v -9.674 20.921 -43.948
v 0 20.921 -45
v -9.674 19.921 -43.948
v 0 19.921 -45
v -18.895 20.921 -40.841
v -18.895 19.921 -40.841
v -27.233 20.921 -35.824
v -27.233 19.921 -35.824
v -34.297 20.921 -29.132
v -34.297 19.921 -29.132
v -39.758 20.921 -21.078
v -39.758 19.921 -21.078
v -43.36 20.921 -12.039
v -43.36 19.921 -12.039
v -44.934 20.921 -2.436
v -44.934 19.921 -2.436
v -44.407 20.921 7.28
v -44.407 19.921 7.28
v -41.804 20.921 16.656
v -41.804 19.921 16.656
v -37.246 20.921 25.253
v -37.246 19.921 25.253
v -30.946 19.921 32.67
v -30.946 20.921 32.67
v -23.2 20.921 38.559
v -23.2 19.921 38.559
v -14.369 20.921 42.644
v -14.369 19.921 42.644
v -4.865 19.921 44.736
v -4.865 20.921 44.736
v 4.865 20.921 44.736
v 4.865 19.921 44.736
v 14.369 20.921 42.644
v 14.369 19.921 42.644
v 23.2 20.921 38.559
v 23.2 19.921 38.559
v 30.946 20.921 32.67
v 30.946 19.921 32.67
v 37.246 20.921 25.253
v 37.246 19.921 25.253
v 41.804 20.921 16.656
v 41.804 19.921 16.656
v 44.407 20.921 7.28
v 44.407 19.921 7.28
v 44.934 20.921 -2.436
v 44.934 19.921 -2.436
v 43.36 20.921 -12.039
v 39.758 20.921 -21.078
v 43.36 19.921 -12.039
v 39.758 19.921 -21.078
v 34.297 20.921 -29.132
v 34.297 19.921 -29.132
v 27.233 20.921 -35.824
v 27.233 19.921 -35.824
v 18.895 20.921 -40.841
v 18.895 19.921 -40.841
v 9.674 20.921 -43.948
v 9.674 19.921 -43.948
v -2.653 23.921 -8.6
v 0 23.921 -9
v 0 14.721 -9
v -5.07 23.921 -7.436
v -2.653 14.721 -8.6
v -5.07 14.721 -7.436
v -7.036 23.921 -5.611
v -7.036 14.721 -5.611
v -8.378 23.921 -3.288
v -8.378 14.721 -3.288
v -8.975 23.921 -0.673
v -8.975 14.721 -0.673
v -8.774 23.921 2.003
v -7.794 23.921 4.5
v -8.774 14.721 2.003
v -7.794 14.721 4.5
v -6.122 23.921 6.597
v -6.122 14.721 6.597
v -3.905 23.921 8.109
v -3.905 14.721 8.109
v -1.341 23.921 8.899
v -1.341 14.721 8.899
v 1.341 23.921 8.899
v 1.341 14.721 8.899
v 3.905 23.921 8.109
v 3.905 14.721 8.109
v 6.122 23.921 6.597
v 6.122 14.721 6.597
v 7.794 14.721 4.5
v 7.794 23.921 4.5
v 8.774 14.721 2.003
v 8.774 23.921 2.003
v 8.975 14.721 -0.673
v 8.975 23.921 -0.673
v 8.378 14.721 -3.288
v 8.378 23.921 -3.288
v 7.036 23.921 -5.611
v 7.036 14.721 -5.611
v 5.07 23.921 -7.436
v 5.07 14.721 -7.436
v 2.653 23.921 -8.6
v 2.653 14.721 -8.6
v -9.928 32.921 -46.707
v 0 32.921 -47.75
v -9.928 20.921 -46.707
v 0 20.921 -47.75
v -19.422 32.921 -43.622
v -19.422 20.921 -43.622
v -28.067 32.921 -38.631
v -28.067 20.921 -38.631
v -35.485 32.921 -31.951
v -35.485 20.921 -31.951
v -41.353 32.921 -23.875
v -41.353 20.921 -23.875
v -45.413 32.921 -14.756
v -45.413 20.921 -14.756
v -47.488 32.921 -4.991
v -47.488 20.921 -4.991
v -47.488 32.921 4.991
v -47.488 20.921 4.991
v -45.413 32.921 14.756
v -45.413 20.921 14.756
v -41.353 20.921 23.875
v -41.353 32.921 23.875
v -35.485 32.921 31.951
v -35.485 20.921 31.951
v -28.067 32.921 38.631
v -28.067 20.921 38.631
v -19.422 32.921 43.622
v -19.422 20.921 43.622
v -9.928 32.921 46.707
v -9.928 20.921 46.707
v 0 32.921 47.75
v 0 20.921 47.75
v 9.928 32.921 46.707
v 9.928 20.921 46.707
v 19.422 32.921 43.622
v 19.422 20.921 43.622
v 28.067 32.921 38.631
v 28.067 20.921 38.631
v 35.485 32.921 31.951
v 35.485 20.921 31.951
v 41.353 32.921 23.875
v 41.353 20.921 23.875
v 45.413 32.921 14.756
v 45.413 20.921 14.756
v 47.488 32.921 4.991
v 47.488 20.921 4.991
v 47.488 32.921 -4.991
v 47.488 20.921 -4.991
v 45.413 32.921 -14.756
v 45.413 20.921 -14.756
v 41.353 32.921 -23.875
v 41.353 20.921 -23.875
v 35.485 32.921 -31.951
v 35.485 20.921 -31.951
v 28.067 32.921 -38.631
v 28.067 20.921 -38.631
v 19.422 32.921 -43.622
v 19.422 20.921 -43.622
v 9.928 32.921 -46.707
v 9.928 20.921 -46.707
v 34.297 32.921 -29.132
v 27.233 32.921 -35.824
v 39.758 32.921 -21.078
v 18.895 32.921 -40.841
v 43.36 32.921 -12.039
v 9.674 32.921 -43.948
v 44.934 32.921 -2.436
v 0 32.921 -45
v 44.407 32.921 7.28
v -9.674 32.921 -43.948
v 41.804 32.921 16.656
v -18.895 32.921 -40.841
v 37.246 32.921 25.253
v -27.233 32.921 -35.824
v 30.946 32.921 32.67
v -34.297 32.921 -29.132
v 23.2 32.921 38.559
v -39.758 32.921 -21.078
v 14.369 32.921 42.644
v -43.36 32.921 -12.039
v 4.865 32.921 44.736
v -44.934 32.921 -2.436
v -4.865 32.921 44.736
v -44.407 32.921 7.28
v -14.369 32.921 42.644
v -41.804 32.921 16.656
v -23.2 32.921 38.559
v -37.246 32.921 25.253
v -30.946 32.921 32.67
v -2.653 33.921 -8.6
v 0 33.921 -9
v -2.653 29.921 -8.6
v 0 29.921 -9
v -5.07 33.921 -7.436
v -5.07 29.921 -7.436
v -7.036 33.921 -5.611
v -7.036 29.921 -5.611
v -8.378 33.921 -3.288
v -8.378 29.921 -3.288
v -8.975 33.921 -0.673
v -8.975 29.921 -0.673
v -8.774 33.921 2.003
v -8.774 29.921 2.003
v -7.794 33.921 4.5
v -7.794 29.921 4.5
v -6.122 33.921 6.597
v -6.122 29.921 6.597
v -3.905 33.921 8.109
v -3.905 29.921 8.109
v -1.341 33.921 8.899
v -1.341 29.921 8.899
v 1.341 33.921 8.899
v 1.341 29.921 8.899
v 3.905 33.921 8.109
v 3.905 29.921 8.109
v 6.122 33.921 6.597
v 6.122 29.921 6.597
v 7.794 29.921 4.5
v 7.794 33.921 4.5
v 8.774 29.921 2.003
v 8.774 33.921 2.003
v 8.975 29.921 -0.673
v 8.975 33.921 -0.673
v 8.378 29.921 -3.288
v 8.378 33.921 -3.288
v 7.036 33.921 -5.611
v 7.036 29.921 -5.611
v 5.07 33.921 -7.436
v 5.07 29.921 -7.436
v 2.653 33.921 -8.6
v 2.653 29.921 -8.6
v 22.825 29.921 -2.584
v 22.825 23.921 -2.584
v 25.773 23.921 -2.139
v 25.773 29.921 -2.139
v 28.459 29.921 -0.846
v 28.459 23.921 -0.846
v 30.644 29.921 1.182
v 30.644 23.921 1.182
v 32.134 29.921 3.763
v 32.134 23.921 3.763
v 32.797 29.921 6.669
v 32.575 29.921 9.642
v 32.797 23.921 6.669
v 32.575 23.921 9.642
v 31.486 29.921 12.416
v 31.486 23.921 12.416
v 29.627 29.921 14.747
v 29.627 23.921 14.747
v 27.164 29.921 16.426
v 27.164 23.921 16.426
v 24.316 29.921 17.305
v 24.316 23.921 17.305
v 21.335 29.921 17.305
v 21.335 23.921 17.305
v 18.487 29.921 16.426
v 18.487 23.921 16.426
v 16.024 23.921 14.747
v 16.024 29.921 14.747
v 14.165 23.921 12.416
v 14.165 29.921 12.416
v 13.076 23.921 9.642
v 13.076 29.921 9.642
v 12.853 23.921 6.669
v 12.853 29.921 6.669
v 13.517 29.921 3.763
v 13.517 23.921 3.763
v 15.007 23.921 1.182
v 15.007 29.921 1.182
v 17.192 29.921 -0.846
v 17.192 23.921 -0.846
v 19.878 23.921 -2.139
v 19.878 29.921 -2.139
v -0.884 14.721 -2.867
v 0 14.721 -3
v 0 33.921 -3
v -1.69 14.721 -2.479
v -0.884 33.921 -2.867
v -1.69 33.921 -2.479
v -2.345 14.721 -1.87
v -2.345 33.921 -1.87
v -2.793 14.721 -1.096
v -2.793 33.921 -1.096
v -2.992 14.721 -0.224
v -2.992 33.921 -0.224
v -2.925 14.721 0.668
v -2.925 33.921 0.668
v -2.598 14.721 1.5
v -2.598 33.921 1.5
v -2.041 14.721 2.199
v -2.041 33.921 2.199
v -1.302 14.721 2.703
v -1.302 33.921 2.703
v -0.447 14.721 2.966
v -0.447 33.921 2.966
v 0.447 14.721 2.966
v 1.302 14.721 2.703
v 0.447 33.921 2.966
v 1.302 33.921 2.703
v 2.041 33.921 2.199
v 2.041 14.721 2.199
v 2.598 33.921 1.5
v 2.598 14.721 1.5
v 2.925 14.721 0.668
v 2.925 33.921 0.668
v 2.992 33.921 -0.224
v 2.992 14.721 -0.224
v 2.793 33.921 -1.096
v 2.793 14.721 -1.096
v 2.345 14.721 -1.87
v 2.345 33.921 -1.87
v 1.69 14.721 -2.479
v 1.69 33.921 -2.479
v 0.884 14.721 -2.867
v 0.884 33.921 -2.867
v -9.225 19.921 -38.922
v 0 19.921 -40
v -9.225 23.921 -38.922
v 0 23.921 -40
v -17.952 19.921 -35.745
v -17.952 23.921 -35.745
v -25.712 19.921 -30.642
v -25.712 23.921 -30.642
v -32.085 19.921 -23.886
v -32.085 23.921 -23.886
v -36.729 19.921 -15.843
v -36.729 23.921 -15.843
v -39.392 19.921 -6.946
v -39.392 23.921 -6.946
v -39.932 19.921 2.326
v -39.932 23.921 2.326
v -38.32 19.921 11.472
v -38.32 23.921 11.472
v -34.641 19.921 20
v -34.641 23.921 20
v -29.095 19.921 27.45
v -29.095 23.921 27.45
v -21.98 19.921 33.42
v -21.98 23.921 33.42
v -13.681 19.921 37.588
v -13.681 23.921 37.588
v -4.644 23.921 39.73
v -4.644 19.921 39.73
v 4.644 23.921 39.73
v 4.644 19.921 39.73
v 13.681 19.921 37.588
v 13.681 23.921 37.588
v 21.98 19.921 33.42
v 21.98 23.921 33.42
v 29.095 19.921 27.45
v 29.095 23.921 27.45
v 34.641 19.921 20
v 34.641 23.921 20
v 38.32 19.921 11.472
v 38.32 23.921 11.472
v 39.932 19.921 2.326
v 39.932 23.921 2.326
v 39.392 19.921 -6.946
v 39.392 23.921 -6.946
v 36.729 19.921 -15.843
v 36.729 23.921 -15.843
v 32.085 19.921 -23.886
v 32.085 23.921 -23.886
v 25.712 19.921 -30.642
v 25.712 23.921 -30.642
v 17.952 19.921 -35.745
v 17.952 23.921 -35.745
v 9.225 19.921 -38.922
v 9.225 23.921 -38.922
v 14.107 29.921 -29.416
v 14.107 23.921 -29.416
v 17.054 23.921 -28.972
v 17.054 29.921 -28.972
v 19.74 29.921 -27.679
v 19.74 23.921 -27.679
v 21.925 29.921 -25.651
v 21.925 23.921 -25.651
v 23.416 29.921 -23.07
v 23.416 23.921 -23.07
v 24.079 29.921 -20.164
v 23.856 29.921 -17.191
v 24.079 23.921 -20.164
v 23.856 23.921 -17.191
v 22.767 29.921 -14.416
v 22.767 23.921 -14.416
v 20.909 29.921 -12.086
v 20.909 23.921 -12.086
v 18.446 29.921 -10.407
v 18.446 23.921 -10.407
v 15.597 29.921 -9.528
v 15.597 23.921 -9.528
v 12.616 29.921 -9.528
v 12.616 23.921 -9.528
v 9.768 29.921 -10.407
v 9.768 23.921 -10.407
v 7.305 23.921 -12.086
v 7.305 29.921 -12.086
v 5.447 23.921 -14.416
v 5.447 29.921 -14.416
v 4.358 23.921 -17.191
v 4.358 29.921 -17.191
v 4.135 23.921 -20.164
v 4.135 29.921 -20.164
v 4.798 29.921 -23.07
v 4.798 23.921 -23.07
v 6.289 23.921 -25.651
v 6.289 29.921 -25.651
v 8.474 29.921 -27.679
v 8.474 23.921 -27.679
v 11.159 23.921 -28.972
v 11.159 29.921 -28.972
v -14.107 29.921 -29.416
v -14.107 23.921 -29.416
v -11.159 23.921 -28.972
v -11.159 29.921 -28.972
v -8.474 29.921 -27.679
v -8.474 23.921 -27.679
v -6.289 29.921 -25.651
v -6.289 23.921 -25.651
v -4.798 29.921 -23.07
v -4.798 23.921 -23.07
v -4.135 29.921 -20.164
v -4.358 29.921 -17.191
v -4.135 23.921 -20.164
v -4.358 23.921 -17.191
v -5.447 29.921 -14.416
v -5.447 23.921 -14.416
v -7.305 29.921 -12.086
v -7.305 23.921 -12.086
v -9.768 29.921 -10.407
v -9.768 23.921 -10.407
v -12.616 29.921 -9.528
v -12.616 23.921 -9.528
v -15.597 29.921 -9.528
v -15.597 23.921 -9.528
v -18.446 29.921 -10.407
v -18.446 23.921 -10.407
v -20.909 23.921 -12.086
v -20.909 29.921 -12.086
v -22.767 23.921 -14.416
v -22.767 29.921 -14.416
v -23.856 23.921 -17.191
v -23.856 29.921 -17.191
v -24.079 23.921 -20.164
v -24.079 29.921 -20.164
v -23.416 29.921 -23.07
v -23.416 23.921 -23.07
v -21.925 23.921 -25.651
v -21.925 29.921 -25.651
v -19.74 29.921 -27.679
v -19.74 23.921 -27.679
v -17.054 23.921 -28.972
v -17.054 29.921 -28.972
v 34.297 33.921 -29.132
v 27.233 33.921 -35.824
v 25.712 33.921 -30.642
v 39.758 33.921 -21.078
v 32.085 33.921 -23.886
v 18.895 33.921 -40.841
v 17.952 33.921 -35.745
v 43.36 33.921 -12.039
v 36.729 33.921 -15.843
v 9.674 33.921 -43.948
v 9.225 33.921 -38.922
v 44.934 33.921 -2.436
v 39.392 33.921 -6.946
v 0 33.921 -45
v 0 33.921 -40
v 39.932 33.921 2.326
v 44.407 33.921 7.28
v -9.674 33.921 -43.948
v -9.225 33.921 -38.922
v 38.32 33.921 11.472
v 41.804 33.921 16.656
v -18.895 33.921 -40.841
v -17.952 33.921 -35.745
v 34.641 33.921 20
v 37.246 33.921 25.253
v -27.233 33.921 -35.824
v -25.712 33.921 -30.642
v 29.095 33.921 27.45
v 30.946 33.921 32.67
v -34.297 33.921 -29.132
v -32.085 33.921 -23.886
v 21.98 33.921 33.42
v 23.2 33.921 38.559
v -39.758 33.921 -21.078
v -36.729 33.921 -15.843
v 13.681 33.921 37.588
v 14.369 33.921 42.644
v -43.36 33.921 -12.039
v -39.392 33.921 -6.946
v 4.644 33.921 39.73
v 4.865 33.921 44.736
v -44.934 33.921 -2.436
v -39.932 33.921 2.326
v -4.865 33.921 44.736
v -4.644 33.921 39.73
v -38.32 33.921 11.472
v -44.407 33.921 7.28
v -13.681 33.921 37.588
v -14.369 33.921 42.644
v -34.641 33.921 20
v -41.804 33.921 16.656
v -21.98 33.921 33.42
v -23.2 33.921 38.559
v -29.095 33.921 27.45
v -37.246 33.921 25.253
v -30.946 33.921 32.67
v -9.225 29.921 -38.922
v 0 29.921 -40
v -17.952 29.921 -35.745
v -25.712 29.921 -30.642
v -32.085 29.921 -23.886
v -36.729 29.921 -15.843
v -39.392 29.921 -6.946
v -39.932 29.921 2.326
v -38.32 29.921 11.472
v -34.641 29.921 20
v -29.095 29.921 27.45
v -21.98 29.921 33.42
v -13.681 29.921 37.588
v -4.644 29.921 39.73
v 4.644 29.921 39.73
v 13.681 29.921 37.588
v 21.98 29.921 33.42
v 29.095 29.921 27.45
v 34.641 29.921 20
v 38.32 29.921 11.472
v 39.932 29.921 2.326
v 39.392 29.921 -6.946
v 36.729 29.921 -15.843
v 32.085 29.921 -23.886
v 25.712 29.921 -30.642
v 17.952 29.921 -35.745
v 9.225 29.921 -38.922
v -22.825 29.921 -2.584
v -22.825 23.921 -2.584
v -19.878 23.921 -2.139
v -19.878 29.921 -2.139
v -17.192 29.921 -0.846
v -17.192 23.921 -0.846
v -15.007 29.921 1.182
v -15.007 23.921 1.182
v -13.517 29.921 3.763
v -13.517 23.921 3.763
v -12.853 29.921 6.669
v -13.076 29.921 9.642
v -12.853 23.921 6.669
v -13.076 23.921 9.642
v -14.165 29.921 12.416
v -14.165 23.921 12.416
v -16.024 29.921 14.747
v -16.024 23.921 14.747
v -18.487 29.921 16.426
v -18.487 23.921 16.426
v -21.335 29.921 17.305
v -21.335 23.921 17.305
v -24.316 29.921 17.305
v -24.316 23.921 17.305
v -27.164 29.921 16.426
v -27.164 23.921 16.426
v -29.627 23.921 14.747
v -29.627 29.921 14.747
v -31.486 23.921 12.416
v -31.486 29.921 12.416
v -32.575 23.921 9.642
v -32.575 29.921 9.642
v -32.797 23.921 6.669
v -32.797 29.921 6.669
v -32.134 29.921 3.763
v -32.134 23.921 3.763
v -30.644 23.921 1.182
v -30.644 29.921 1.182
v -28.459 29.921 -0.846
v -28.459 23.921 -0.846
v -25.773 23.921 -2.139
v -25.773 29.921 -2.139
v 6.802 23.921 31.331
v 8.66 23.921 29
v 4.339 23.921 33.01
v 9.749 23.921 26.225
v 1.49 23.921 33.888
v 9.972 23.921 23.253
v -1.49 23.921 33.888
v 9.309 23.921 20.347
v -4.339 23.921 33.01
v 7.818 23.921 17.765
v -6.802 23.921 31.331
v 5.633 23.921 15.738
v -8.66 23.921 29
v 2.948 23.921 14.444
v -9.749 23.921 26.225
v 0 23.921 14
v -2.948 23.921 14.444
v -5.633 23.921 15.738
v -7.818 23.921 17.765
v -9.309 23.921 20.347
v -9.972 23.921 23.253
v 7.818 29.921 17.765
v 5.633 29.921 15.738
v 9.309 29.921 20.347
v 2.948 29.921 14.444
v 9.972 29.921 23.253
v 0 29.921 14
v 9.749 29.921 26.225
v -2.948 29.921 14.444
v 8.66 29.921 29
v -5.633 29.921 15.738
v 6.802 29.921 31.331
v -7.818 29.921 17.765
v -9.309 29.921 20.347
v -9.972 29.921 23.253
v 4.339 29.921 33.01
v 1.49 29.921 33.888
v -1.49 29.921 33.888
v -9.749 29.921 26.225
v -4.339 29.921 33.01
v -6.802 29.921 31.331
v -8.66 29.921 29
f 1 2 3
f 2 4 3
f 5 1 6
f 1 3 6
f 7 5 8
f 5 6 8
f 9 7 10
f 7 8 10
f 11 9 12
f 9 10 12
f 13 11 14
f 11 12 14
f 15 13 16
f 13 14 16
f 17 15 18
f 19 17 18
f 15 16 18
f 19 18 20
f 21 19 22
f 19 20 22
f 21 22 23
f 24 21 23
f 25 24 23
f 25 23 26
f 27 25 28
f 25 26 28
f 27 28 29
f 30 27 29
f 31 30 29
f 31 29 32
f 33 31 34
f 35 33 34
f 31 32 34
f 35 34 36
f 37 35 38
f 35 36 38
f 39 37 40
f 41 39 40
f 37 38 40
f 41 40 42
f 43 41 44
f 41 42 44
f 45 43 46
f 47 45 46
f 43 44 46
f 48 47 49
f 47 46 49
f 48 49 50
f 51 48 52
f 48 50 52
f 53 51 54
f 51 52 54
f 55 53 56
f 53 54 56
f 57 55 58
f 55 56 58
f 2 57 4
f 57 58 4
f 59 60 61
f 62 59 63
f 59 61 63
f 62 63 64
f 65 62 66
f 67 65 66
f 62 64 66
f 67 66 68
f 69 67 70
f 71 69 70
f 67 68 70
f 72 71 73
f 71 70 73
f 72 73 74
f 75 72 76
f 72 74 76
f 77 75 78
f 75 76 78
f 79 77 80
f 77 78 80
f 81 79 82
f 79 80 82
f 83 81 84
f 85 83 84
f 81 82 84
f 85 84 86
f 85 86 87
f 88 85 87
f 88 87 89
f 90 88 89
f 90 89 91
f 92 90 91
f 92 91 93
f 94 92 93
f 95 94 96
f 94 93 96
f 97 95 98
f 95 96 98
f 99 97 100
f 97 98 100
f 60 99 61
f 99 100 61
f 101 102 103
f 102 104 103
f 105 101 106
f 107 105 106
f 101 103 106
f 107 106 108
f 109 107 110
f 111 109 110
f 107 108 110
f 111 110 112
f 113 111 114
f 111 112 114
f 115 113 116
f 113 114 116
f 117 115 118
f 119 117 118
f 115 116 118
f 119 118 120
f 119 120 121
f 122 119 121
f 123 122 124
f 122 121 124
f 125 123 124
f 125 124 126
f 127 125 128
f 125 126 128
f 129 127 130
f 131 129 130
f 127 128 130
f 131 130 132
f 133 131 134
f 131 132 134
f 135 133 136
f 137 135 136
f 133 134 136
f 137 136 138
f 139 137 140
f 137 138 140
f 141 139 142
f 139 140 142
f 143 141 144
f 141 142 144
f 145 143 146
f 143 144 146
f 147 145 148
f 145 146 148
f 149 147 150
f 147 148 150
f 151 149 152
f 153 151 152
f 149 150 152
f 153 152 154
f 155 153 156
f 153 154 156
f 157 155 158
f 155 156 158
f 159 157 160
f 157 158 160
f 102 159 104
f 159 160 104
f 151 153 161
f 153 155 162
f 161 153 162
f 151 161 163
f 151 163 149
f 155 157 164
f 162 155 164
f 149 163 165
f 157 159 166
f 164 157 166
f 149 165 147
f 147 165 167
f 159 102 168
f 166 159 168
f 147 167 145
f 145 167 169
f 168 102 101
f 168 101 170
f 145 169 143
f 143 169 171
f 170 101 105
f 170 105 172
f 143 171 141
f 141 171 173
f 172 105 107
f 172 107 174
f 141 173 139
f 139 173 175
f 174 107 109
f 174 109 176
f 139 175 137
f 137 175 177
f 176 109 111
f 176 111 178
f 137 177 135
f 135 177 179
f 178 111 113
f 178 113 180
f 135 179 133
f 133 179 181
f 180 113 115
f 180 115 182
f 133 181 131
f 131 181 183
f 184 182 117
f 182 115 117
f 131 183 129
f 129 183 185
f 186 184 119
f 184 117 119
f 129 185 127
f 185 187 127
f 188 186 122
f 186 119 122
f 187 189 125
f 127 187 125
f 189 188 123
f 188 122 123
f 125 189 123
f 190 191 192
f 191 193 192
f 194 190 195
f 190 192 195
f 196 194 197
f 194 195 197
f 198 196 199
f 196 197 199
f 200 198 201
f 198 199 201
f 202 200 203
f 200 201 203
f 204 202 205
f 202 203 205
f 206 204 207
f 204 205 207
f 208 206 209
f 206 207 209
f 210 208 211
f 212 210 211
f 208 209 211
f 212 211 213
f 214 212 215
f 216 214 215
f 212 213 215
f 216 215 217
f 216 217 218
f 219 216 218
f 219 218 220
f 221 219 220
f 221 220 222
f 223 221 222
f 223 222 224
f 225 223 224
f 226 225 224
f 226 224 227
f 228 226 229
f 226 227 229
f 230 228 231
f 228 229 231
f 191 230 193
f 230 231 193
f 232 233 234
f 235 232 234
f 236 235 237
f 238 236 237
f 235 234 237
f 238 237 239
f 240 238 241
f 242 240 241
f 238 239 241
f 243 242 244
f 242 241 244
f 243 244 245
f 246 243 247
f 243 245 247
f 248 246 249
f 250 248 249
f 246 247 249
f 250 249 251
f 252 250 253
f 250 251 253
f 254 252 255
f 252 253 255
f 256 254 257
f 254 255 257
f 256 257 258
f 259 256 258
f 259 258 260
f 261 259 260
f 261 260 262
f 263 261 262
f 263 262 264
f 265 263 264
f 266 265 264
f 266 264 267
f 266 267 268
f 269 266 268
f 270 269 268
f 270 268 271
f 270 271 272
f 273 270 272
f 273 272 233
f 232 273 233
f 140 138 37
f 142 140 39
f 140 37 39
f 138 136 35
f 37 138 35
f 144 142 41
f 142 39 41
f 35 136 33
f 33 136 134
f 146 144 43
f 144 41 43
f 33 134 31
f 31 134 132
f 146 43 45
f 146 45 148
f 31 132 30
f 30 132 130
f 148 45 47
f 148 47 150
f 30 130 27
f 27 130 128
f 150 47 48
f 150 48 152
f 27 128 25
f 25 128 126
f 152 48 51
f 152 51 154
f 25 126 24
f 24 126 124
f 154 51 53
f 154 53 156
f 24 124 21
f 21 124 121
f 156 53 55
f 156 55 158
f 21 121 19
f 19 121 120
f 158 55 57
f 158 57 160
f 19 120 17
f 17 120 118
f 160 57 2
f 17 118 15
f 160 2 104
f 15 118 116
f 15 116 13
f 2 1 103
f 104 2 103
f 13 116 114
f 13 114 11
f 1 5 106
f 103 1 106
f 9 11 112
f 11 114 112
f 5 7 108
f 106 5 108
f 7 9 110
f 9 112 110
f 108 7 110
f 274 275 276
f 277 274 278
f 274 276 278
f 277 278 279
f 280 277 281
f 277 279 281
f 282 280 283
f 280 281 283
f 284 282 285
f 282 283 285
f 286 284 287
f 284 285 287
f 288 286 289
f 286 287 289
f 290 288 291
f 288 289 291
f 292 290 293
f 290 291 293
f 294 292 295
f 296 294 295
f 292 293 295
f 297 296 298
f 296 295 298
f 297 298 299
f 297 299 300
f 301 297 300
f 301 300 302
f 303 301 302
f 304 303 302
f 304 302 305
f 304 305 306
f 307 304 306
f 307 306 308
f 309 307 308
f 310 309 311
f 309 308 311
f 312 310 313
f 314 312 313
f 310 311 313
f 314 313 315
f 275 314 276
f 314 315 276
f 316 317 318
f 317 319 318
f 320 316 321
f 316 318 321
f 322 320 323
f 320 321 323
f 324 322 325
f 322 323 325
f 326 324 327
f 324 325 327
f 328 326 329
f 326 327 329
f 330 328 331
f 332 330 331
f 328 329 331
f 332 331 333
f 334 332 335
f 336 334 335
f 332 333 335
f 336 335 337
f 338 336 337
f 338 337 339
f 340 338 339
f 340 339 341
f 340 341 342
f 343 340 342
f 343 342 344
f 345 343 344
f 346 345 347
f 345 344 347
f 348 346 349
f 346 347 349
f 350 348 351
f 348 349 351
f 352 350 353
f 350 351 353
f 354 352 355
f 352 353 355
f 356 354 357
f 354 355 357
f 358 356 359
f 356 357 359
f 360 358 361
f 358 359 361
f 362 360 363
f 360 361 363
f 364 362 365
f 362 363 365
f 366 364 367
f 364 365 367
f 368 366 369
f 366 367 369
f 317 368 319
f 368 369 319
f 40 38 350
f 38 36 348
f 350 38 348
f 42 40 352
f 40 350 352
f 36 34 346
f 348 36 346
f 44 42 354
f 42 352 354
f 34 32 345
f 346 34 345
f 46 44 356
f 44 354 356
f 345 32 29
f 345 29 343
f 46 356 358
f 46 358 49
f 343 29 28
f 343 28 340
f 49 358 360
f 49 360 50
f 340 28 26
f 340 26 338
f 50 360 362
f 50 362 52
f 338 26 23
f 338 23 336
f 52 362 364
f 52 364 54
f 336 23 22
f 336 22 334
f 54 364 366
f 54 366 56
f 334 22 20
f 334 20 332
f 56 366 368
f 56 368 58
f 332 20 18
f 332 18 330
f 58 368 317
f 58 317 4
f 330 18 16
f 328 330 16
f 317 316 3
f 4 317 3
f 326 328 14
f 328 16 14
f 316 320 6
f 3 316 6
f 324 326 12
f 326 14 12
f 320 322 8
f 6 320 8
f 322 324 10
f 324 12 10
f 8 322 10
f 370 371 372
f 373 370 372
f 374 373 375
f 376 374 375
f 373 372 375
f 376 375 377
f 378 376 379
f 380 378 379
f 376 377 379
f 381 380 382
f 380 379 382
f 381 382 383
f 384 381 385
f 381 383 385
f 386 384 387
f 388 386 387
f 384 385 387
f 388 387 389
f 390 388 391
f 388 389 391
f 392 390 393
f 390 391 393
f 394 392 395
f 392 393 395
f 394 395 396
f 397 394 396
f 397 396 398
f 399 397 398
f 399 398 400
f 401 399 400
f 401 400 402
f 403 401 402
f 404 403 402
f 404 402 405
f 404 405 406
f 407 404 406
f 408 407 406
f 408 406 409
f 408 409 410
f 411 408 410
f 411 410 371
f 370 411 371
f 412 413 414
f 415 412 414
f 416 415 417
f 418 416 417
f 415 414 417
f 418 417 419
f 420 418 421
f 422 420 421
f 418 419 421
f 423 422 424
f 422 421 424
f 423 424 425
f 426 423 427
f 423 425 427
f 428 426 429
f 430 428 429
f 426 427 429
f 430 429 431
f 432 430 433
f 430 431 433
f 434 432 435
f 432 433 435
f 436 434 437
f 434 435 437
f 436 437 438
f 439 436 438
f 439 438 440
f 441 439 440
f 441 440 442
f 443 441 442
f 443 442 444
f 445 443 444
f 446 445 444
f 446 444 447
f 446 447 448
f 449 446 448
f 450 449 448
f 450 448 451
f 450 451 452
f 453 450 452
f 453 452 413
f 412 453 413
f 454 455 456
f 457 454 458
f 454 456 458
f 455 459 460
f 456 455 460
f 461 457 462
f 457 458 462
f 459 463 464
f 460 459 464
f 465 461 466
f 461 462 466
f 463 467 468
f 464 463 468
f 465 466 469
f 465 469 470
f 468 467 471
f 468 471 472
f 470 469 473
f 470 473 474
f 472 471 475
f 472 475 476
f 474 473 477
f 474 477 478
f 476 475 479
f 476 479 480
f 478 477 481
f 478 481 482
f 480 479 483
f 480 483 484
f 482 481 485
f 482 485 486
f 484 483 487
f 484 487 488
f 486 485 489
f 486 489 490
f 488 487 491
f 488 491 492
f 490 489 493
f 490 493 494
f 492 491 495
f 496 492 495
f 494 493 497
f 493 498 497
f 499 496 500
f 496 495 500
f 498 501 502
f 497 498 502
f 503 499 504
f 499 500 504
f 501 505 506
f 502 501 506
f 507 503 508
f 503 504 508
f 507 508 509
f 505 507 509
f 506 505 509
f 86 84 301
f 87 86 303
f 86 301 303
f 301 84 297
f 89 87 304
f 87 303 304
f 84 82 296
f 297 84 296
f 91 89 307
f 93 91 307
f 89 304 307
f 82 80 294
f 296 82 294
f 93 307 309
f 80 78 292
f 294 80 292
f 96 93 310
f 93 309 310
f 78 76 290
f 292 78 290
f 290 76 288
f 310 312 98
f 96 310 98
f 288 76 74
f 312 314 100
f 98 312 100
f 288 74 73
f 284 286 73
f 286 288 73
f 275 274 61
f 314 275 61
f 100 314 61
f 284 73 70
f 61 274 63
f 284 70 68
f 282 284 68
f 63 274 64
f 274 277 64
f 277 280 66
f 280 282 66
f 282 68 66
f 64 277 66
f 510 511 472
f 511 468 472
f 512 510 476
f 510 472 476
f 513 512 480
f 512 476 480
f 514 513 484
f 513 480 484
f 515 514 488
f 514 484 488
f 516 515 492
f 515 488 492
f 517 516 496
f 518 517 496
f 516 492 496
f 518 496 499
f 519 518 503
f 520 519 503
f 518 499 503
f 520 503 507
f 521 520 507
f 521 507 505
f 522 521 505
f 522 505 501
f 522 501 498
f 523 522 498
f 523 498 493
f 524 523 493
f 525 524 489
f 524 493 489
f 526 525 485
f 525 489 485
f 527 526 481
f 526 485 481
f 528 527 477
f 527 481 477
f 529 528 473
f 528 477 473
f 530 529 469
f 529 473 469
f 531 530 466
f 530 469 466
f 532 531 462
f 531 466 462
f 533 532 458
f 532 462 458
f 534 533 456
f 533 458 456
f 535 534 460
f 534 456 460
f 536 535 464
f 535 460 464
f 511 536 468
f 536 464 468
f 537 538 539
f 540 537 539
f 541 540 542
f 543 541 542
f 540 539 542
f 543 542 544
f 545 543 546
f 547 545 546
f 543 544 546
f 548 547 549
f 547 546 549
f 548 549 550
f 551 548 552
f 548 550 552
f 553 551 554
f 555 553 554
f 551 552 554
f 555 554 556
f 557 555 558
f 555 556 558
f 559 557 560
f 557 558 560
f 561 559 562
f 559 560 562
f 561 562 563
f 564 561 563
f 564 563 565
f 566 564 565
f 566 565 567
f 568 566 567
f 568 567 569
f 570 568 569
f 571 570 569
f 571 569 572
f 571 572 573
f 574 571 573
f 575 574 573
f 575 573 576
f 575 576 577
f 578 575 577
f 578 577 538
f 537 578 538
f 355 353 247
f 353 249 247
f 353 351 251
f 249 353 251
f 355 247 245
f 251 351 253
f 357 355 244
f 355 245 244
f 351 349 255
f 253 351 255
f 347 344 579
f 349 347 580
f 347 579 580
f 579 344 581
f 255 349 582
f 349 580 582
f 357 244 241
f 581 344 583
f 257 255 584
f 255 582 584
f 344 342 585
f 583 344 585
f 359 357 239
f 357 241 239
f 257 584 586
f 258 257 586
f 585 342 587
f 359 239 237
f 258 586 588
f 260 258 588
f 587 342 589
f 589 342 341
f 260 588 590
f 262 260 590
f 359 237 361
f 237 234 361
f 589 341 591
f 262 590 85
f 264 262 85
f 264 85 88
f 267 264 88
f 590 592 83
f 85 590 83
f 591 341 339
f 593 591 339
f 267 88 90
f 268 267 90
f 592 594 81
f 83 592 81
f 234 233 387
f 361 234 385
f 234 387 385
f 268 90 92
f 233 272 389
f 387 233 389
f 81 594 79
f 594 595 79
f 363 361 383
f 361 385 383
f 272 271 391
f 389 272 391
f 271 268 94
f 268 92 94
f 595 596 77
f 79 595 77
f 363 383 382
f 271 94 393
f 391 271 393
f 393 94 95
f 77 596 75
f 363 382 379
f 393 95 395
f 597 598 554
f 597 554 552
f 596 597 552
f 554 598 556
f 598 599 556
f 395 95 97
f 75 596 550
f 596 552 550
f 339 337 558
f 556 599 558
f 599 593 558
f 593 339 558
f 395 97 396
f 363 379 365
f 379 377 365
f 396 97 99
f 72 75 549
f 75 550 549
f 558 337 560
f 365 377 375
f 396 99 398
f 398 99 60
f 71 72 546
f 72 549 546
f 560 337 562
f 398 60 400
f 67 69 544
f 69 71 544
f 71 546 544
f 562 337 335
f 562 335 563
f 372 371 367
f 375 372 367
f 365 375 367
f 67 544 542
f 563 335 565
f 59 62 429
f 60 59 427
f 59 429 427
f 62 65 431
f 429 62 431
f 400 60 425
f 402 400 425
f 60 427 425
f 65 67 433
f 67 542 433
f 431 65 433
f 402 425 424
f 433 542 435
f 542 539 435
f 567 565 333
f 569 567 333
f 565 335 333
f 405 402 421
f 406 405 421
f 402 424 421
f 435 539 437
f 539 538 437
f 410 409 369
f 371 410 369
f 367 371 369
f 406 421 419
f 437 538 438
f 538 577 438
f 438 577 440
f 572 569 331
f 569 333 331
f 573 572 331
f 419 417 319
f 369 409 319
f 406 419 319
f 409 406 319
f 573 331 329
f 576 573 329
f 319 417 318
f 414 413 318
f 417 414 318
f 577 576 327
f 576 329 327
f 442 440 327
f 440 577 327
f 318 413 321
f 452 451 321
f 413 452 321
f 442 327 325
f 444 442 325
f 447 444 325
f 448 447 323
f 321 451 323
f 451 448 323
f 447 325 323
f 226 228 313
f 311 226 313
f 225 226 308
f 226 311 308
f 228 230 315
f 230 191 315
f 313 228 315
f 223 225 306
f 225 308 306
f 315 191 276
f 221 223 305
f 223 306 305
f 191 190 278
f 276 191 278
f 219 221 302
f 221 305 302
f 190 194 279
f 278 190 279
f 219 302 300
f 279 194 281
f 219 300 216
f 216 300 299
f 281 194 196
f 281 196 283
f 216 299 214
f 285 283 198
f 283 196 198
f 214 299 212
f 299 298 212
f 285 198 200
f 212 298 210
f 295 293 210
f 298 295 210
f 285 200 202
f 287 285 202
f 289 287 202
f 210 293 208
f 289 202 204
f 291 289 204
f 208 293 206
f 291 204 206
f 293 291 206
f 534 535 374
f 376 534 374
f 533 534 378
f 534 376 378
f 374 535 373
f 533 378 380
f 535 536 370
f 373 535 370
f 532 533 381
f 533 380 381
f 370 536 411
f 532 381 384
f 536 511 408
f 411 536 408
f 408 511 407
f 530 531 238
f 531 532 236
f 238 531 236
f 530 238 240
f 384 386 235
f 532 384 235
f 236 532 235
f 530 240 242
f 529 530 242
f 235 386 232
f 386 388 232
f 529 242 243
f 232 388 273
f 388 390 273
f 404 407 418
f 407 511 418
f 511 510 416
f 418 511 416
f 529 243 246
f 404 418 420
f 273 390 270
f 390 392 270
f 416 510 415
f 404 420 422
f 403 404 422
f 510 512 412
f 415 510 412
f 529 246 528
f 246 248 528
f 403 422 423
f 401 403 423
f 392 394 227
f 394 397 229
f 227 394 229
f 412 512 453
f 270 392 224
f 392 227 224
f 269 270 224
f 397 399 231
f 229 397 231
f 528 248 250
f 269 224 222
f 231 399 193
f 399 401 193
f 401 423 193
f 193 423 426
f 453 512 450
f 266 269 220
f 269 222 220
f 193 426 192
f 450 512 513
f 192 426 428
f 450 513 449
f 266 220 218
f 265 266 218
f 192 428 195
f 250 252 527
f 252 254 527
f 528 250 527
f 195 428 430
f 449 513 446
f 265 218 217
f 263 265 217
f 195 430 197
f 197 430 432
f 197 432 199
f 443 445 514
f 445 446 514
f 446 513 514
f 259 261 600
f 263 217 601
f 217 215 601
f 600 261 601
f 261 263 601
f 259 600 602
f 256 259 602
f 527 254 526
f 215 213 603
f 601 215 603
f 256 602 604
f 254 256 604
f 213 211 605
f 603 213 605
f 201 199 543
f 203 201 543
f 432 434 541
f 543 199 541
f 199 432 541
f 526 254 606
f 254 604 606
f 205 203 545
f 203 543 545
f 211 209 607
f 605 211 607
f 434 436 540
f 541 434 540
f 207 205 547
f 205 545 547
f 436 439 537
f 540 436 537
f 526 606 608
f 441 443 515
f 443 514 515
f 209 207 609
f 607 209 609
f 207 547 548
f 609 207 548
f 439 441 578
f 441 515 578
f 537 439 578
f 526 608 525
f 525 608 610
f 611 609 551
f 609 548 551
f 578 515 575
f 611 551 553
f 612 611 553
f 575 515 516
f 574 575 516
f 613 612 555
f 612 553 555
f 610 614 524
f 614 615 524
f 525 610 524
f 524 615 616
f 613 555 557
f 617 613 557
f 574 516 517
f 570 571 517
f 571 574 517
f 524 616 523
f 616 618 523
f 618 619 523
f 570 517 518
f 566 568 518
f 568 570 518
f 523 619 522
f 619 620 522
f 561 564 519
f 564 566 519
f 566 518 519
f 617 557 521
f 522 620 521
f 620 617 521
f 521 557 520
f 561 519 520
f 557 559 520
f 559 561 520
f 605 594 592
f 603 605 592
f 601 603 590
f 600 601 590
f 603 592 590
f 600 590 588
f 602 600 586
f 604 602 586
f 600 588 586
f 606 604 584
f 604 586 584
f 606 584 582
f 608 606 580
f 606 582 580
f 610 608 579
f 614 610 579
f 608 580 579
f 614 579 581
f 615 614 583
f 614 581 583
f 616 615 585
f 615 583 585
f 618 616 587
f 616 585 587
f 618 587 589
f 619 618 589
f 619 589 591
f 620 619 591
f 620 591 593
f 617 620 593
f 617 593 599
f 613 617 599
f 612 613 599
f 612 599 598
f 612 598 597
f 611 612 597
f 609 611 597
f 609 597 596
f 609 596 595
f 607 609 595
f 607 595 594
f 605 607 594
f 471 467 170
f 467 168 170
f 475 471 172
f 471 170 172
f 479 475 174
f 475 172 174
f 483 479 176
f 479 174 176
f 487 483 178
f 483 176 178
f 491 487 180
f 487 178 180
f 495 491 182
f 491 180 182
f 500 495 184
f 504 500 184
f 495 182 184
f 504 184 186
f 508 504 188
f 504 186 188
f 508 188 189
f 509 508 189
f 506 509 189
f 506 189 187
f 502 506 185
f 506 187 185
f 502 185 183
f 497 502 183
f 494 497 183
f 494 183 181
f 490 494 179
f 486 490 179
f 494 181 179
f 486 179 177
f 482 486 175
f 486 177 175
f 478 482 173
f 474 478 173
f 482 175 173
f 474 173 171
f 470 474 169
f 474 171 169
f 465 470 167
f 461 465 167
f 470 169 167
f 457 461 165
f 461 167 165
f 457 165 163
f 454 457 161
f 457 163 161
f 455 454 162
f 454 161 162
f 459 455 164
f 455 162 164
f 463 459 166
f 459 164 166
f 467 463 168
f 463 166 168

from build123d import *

# Parameters (mm, degrees)
SKETCH_2_R          = 10
CUT_EXTRUDE_1_DEPTH = 10


with BuildPart() as part:
    # 草图1 → 旋转1 (revolve)
    with BuildSketch(Plane.XY, mode=Mode.PRIVATE) as revolve_1_sk:
        Polygon((-3, 33.921052632), (-9, 33.921052632), (-9, 29.921052632), (-40, 29.921052632), (-40, 33.921052632), (-45, 33.921052632), (-45, 32.921052632), (-47.75, 32.921052632), (-47.75, 20.921052632), (-45, 20.921052632), (-45, 19.921052632), (-40, 19.921052632), (-40, 23.921052632), (-9, 23.921052632), (-9, 19.921052632), (-9, 14.721052632), (-3, 14.721052632), align=None)
    revolve(revolve_1_sk.sketch.rotate(Axis((0, 0, 0), (0, 1, 0)), 270), axis=Axis((0, 0, 0), (0, 1, 0)))

    # 草图2 → 切除-拉伸1 (cut)
    with BuildSketch(Plane.XZ.offset(-23.921052632)):
        with Locations(Location((0, 24, 0), (0, 0, 270))):
            Circle(SKETCH_2_R)
        with Locations(Location((22.825356391, 7.416407865, 0), (0, 0, 270))):
            Circle(SKETCH_2_R)
        with Locations(Location((14.106846055, -19.416407865, 0), (0, 0, 270))):
            Circle(SKETCH_2_R)
        with Locations(Location((-14.106846055, -19.416407865, 0), (0, 0, 270))):
            Circle(SKETCH_2_R)
        with Locations(Location((-22.825356391, 7.416407865, 0), (0, 0, 270))):
            Circle(SKETCH_2_R)
    extrude(amount=-CUT_EXTRUDE_1_DEPTH, mode=Mode.SUBTRACT)


solid = part.part
